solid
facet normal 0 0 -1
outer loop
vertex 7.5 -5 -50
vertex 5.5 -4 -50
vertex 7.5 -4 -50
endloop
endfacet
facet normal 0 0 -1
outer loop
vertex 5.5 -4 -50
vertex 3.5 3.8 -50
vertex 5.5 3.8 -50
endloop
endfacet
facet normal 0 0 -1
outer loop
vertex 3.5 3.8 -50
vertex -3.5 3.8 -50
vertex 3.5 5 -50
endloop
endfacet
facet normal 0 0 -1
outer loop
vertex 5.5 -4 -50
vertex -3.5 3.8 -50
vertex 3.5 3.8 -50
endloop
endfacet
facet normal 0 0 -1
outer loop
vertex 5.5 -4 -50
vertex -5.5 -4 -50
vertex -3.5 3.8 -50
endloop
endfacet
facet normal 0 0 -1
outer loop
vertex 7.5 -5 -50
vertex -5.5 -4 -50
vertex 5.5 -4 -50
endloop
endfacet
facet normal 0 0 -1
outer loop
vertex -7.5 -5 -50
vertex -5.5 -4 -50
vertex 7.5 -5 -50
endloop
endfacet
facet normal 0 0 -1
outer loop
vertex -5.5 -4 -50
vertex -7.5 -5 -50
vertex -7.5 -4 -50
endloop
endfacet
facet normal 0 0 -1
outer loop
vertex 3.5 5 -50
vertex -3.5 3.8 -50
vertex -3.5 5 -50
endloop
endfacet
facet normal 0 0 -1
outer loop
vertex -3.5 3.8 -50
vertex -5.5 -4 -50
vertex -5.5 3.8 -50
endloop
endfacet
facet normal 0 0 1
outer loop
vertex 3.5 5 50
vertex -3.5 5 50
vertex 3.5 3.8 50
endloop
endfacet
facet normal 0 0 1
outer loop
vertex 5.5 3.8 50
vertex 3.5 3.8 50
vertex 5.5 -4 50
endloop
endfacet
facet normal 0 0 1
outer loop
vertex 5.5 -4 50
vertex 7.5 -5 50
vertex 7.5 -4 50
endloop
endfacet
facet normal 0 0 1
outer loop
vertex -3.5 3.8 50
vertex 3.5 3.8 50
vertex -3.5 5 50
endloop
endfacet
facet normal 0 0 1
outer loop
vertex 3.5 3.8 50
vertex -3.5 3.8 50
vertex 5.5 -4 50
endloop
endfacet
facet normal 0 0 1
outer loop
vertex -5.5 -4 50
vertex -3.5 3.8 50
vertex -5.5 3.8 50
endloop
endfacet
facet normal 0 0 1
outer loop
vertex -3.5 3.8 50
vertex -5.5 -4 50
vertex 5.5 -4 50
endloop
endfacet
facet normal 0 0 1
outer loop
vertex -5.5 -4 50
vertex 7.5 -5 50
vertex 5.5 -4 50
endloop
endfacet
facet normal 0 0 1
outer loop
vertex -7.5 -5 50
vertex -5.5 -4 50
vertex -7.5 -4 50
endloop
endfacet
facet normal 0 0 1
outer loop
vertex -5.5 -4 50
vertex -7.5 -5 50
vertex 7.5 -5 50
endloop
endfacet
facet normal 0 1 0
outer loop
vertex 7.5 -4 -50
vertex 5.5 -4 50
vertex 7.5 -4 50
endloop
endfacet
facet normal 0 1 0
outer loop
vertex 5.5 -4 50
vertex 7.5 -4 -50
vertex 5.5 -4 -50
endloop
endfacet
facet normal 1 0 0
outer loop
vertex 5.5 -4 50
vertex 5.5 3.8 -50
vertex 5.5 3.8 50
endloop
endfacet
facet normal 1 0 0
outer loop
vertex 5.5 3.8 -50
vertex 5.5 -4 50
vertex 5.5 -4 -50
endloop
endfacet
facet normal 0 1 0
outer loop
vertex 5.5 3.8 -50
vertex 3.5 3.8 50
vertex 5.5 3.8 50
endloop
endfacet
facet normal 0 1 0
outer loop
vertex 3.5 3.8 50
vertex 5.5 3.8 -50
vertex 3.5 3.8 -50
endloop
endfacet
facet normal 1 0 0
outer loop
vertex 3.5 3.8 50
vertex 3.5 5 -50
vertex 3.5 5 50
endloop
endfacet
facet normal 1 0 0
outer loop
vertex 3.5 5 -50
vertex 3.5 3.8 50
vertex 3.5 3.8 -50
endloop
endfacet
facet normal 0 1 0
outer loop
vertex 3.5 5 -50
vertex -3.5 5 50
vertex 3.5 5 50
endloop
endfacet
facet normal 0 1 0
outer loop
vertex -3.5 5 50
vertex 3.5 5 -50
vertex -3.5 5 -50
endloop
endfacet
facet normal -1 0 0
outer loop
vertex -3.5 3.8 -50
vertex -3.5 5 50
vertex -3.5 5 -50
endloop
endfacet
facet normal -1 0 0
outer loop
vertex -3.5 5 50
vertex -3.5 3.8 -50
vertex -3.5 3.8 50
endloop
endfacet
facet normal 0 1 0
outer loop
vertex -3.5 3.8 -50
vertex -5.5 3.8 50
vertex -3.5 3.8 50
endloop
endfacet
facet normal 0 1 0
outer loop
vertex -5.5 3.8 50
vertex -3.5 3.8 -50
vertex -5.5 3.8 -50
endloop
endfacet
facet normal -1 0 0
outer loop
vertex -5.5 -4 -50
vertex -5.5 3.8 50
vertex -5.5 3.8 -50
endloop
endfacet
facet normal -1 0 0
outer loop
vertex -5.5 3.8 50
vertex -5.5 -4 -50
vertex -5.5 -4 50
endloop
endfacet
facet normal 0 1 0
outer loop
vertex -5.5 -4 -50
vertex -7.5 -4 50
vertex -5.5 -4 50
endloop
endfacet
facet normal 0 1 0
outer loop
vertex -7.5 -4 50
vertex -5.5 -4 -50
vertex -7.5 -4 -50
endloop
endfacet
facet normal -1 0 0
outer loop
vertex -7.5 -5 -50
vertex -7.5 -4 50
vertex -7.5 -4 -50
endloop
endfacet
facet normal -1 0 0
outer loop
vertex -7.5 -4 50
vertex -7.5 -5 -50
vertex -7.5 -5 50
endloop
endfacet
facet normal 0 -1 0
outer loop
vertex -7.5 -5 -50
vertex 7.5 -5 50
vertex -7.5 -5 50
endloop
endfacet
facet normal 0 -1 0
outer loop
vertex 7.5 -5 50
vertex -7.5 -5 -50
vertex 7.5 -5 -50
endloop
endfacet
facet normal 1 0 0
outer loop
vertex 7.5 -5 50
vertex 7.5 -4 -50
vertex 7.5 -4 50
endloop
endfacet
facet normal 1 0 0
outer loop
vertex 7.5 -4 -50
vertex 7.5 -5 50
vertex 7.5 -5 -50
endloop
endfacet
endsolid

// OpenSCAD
// Miniature linear guide rail — 15mm W x 10mm H x 100mm L
// One connected solid with profile steps, side raceways, and mounting holes.

$fn = 96;

// Overall dimensions
rail_L = 100;
rail_W = 15;
rail_H = 10;

// Small overlap for robust booleans
overlap = 0.25;

// Profile features (kept within overall W/H)
top_land_W  = 7.0;   // top flat width
top_land_H  = 1.2;   // top flat thickness
side_step_W = 2.0;   // inset per side above bottom step
side_step_H = 1.0;   // bottom step height

// Raceway grooves (visual cue)
groove_r     = 1.2;
groove_inset = 0.9;  // distance from outer side to groove center (must be > groove_r)
groove_z     = 0.0;  // centered vertically

// Mounting holes (through height, counterbore on top)
hole_d = 3.0;
cbore_d = 5.6;
cbore_h = 2.0;

// Hole layout: 4 holes along length, symmetric and guaranteed inside rail_L
hole_edge_margin = 10.0;
hole_pitch = 25.0;

// Derived hole positions (centered about X=0)
xs = [
    -rail_L/2 + hole_edge_margin,
    -rail_L/2 + hole_edge_margin + hole_pitch,
    -rail_L/2 + hole_edge_margin + 2*hole_pitch,
    -rail_L/2 + hole_edge_margin + 3*hole_pitch
];

// 2D profile in (Y,Z), extruded along X
module rail_profile_2d() {
    polygon(points=[
        [-rail_W/2, -rail_H/2],
        [ rail_W/2, -rail_H/2],

        [ rail_W/2, -rail_H/2 + side_step_H],
        [ rail_W/2 - side_step_W, -rail_H/2 + side_step_H],

        [ rail_W/2 - side_step_W,  rail_H/2 - top_land_H],
        [ top_land_W/2,            rail_H/2 - top_land_H],
        [ top_land_W/2,            rail_H/2],
        [-top_land_W/2,            rail_H/2],
        [-top_land_W/2,            rail_H/2 - top_land_H],
        [-rail_W/2 + side_step_W,  rail_H/2 - top_land_H],

        [-rail_W/2 + side_step_W, -rail_H/2 + side_step_H],
        [-rail_W/2,               -rail_H/2 + side_step_H]
    ]);
}

module rail_solid() {
    // Extrude along X directly (no rotate needed)
    linear_extrude(height=rail_L, center=true, convexity=10)
        rail_profile_2d();
}

module raceway_grooves() {
    // Two longitudinal grooves cut into the sides, cylinders along X
    // Place groove centers inside the side faces by groove_inset.
    for (s = [-1, 1]) {
        translate([0, s*(rail_W/2 - groove_inset), groove_z])
            rotate([0,90,0])
                cylinder(h=rail_L + 2*overlap, r=groove_r, center=true);
    }
}

module mounting_holes_and_counterbores() {
    for (xi = xs) {
        // Through hole along Z (height)
        translate([xi, 0, 0])
            cylinder(h=rail_H + 2*overlap, r=hole_d/2, center=true);

        // Counterbore from top face (downward into rail)
        translate([xi, 0, rail_H/2 - cbore_h/2])
            cylinder(h=cbore_h + 2*overlap, r=cbore_d/2, center=true);
    }
}

difference() {
    rail_solid();
    raceway_grooves();
    mounting_holes_and_counterbores();
}
